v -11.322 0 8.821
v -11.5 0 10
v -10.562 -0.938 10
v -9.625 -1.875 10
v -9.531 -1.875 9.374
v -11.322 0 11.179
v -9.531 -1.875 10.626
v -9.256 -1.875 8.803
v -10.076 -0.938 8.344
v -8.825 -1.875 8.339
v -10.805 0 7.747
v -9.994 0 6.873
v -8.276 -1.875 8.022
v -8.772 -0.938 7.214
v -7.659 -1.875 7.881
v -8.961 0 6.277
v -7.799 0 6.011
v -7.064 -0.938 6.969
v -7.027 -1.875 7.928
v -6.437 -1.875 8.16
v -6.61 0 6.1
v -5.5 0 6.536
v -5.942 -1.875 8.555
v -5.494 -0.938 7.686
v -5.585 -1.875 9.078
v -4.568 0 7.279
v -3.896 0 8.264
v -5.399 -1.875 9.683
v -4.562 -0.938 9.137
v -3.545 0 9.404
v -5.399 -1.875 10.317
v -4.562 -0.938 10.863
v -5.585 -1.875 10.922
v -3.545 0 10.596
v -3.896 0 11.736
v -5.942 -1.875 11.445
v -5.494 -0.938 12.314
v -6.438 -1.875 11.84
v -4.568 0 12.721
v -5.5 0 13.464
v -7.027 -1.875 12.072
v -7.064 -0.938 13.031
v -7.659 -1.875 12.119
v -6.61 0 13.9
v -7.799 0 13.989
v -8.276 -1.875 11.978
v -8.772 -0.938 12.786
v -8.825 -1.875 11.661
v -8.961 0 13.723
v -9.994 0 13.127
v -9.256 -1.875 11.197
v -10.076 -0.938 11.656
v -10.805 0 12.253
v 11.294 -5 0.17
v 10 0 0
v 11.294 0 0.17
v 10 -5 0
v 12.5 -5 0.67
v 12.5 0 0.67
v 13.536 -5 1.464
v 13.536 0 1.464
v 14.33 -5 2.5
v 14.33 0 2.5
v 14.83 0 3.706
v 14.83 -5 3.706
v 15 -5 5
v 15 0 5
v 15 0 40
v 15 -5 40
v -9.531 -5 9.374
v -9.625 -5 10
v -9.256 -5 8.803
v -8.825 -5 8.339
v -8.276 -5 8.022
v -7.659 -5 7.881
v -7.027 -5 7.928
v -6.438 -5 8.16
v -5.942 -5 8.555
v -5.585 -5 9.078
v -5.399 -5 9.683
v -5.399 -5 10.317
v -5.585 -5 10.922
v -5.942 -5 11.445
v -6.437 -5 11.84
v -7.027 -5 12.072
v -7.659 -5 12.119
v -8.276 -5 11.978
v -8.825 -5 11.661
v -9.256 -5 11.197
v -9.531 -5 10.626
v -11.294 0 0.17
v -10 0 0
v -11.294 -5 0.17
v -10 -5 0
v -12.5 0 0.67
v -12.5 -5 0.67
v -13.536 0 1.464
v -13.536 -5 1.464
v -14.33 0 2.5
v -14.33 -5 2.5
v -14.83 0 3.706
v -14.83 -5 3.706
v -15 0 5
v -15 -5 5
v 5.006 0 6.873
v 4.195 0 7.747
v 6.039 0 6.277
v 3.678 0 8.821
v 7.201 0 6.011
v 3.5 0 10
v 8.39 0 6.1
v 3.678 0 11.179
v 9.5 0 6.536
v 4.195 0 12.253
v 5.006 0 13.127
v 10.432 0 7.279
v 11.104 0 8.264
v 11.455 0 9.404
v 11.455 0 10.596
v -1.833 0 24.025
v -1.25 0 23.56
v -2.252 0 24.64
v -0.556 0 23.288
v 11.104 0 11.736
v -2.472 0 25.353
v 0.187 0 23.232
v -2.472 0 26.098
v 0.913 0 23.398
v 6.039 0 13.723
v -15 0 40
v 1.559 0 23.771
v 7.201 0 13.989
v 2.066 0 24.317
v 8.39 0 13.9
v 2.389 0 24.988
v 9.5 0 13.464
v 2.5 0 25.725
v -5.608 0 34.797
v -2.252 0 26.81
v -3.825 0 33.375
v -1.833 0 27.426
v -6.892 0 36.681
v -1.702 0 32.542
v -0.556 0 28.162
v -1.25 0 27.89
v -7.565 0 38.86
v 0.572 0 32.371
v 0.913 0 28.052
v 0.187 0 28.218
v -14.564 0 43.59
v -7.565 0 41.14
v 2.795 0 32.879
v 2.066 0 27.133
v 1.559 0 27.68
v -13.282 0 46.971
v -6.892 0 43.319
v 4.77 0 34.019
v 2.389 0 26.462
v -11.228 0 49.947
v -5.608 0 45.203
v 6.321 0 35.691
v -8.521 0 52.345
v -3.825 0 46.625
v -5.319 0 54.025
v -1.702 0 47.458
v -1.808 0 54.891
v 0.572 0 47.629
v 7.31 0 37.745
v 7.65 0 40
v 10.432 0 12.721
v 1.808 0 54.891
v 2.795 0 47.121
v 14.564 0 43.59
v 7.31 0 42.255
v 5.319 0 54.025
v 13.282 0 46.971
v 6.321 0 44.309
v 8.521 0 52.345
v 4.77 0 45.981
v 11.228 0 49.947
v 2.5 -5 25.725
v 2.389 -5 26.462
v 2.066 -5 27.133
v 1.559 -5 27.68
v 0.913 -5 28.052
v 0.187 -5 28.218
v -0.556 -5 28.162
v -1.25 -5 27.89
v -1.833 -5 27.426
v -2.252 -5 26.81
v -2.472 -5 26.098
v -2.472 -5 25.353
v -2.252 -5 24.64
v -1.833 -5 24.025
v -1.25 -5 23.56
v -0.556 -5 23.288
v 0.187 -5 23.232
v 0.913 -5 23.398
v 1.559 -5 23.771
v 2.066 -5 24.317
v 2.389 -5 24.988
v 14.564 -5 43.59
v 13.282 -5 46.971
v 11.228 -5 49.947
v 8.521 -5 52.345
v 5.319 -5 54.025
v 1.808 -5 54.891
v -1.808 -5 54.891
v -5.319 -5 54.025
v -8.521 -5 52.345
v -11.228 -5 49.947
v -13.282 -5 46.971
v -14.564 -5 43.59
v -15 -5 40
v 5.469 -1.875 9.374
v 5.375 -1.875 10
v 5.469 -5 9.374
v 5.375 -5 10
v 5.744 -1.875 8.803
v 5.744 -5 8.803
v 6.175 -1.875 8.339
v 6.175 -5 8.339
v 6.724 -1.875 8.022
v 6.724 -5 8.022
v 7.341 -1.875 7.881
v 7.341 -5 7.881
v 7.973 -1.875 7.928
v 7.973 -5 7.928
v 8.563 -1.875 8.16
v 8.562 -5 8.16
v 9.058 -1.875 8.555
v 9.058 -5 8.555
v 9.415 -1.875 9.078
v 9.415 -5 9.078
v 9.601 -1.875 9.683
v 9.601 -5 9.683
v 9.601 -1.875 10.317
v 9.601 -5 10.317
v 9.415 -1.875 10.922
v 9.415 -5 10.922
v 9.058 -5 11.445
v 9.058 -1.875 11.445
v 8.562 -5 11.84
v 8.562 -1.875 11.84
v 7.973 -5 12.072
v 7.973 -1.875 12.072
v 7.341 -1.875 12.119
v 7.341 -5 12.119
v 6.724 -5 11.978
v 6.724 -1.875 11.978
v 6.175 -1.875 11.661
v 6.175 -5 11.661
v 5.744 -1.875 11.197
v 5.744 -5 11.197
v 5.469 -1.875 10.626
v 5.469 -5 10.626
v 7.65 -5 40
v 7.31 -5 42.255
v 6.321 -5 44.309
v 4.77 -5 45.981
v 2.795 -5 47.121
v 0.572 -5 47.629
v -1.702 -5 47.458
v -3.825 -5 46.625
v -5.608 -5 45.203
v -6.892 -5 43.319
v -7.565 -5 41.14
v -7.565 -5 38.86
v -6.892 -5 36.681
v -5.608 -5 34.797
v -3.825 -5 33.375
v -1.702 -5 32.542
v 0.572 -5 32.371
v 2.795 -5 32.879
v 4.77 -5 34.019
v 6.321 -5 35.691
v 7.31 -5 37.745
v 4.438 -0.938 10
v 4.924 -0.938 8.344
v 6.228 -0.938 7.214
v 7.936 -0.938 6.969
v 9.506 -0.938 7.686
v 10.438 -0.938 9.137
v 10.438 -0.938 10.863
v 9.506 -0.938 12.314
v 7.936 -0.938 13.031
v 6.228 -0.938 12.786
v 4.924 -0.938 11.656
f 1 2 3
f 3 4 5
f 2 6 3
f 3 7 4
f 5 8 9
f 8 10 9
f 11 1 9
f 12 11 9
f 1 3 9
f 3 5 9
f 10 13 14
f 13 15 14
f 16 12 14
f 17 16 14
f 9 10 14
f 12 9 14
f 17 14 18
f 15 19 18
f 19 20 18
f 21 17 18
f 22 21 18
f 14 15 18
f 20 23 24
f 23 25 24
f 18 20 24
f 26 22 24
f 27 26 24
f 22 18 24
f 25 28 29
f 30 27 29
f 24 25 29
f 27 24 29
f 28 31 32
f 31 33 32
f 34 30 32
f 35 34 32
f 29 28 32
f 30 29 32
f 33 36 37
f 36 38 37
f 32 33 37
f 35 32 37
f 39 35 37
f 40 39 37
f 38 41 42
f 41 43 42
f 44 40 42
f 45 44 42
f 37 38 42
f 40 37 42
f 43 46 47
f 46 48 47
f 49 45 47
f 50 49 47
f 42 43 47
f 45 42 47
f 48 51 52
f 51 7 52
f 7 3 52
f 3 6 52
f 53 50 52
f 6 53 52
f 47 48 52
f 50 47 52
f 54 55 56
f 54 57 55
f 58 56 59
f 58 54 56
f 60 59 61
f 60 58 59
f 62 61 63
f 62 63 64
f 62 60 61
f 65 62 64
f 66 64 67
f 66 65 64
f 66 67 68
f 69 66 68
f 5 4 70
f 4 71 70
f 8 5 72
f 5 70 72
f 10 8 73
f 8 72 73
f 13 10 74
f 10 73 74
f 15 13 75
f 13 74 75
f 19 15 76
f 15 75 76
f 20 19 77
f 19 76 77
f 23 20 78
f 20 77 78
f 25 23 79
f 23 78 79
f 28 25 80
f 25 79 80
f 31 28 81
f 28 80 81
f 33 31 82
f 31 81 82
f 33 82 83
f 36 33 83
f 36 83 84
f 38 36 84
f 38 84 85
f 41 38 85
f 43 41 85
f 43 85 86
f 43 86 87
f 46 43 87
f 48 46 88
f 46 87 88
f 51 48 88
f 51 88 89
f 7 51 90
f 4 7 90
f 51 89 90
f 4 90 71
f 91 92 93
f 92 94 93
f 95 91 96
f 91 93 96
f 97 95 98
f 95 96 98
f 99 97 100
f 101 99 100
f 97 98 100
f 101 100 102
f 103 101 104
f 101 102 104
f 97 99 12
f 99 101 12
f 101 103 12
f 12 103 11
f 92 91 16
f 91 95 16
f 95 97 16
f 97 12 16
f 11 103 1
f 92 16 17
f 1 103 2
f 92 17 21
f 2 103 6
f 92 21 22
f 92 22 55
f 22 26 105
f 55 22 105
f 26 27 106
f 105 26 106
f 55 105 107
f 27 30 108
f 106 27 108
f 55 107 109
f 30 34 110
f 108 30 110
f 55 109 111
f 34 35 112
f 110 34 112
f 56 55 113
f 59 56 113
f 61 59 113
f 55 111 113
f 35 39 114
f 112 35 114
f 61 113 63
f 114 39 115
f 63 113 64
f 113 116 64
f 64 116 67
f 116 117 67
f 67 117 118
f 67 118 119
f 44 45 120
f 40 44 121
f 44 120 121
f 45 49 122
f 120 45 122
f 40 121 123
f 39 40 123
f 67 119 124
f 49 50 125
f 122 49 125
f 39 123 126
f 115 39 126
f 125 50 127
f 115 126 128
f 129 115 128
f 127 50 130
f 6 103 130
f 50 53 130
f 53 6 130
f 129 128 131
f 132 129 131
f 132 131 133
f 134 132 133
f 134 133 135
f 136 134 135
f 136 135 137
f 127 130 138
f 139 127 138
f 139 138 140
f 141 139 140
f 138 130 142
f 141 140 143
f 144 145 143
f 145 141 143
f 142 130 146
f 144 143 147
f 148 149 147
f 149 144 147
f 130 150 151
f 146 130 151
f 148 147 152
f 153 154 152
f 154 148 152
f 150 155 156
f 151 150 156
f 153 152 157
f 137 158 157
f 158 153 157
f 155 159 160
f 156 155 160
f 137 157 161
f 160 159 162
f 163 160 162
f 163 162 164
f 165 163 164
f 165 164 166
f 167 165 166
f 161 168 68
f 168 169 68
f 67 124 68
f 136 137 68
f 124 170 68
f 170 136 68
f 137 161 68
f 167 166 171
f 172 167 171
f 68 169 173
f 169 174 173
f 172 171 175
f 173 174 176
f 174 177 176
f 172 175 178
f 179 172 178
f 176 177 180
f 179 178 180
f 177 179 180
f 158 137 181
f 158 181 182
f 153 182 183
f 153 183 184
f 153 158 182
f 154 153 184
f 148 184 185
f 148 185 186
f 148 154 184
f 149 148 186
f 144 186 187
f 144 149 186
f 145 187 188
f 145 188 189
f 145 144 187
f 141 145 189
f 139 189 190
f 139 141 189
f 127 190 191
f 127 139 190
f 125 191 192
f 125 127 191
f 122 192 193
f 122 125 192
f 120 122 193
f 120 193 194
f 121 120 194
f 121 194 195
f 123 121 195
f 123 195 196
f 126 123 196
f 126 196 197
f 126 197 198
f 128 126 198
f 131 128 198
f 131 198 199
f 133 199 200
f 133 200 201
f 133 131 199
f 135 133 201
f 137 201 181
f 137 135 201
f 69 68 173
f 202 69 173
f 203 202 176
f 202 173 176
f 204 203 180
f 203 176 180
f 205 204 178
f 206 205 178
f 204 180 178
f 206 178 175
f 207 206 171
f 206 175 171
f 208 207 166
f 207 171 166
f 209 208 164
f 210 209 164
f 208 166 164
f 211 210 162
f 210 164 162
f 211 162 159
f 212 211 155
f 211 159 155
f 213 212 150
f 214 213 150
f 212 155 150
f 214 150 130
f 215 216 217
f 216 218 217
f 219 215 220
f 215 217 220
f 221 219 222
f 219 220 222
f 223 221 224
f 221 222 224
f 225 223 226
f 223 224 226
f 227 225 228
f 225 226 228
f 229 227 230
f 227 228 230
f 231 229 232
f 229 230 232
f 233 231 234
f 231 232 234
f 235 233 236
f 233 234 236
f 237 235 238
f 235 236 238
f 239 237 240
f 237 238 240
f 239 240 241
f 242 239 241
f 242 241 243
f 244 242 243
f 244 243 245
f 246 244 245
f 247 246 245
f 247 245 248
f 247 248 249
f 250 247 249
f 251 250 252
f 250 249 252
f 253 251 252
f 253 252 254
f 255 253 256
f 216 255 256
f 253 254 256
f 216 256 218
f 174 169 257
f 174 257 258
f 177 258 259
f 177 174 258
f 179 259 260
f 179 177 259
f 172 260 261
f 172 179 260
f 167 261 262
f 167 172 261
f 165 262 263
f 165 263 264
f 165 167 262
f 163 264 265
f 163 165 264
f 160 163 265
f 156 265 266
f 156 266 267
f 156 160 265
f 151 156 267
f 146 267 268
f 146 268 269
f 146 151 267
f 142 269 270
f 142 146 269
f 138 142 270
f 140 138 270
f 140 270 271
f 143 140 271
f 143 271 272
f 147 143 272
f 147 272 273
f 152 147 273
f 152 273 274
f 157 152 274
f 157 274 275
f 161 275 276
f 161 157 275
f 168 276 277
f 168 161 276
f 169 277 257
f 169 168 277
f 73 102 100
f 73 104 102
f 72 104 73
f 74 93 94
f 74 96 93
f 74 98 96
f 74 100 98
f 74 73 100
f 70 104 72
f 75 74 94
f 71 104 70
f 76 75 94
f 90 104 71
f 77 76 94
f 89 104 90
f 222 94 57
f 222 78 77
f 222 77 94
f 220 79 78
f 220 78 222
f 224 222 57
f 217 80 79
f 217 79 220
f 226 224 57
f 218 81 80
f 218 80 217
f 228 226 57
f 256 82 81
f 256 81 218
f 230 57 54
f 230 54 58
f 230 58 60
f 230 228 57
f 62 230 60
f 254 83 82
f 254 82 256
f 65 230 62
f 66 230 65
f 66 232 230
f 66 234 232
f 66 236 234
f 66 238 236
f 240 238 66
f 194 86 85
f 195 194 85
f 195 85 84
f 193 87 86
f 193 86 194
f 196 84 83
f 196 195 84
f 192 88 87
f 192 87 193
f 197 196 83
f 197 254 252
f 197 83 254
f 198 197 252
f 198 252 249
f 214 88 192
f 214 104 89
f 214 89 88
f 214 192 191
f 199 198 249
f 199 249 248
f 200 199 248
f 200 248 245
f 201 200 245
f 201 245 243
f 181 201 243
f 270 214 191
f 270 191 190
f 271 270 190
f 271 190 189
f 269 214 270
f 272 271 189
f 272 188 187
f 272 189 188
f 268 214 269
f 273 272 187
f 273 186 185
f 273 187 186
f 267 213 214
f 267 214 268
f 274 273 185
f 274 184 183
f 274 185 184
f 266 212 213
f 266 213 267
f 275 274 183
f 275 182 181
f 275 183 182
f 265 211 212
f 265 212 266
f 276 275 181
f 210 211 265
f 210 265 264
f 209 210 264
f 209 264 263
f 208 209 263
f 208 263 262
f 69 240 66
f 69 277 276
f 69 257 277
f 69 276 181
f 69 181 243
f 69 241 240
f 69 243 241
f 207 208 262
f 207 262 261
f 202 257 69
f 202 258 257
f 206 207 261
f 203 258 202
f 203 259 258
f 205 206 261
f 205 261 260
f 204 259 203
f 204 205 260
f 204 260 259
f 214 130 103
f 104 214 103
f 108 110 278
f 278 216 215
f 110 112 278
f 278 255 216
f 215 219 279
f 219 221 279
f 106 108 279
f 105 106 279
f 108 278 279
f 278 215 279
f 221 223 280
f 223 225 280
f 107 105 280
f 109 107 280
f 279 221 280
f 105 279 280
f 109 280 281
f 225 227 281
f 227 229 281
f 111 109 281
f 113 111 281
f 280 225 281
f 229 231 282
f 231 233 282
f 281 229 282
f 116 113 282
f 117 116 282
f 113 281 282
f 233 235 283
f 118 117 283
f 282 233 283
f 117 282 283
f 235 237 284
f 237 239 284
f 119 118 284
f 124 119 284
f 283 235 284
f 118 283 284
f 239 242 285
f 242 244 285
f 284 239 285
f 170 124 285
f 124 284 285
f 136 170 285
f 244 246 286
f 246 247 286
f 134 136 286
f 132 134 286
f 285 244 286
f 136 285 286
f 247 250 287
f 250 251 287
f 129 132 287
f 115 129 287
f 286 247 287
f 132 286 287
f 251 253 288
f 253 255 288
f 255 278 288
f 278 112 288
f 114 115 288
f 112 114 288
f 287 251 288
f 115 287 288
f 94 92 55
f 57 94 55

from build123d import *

# Parameters (mm, degrees)
F0_R           = 2.5
F0_R_2         = 7.65
F1_DEPTH       = 5
F2_D           = 4.25
F2_CSINK_D     = 8
F2_CSINK_ANGLE = 90
F3_R           = 5


with BuildPart() as f1:
    # F0 (on Front) → F1 (new body)
    with BuildSketch(Plane.XZ):
        with BuildLine():
            Line((-15, 0), (0, 0))
            Line((0, 0), (15, 0))
            Line((15, 0), (15, 40))
            ThreePointArc((15, 40), (0, 55), (-15, 40))
            Line((-15, 40), (-15, 0))
        make_face()
        with Locations((0, 25.7251504809)):
            Circle(F0_R, mode=Mode.SUBTRACT)
        with Locations((0, 40)):
            Circle(F0_R_2, mode=Mode.SUBTRACT)
    extrude(amount=F1_DEPTH)

    # F2 (through all)
    with Locations(Plane(origin=(0, 0, 0), x_dir=(1, 0, 0), z_dir=(0, 1, 0))):
        with Locations((-7.5, -10), (7.5, -10)):
            CounterSinkHole(F2_D / 2, F2_CSINK_D / 2, counter_sink_angle=F2_CSINK_ANGLE)

    # F3
    f3_edges = [f1.edges().sort_by_distance(p)[0] for p in [
        (-15, -2.5, 0),
        (15, -2.5, 0),
    ]]
    fillet(f3_edges, radius=F3_R)


solid = f1.part
